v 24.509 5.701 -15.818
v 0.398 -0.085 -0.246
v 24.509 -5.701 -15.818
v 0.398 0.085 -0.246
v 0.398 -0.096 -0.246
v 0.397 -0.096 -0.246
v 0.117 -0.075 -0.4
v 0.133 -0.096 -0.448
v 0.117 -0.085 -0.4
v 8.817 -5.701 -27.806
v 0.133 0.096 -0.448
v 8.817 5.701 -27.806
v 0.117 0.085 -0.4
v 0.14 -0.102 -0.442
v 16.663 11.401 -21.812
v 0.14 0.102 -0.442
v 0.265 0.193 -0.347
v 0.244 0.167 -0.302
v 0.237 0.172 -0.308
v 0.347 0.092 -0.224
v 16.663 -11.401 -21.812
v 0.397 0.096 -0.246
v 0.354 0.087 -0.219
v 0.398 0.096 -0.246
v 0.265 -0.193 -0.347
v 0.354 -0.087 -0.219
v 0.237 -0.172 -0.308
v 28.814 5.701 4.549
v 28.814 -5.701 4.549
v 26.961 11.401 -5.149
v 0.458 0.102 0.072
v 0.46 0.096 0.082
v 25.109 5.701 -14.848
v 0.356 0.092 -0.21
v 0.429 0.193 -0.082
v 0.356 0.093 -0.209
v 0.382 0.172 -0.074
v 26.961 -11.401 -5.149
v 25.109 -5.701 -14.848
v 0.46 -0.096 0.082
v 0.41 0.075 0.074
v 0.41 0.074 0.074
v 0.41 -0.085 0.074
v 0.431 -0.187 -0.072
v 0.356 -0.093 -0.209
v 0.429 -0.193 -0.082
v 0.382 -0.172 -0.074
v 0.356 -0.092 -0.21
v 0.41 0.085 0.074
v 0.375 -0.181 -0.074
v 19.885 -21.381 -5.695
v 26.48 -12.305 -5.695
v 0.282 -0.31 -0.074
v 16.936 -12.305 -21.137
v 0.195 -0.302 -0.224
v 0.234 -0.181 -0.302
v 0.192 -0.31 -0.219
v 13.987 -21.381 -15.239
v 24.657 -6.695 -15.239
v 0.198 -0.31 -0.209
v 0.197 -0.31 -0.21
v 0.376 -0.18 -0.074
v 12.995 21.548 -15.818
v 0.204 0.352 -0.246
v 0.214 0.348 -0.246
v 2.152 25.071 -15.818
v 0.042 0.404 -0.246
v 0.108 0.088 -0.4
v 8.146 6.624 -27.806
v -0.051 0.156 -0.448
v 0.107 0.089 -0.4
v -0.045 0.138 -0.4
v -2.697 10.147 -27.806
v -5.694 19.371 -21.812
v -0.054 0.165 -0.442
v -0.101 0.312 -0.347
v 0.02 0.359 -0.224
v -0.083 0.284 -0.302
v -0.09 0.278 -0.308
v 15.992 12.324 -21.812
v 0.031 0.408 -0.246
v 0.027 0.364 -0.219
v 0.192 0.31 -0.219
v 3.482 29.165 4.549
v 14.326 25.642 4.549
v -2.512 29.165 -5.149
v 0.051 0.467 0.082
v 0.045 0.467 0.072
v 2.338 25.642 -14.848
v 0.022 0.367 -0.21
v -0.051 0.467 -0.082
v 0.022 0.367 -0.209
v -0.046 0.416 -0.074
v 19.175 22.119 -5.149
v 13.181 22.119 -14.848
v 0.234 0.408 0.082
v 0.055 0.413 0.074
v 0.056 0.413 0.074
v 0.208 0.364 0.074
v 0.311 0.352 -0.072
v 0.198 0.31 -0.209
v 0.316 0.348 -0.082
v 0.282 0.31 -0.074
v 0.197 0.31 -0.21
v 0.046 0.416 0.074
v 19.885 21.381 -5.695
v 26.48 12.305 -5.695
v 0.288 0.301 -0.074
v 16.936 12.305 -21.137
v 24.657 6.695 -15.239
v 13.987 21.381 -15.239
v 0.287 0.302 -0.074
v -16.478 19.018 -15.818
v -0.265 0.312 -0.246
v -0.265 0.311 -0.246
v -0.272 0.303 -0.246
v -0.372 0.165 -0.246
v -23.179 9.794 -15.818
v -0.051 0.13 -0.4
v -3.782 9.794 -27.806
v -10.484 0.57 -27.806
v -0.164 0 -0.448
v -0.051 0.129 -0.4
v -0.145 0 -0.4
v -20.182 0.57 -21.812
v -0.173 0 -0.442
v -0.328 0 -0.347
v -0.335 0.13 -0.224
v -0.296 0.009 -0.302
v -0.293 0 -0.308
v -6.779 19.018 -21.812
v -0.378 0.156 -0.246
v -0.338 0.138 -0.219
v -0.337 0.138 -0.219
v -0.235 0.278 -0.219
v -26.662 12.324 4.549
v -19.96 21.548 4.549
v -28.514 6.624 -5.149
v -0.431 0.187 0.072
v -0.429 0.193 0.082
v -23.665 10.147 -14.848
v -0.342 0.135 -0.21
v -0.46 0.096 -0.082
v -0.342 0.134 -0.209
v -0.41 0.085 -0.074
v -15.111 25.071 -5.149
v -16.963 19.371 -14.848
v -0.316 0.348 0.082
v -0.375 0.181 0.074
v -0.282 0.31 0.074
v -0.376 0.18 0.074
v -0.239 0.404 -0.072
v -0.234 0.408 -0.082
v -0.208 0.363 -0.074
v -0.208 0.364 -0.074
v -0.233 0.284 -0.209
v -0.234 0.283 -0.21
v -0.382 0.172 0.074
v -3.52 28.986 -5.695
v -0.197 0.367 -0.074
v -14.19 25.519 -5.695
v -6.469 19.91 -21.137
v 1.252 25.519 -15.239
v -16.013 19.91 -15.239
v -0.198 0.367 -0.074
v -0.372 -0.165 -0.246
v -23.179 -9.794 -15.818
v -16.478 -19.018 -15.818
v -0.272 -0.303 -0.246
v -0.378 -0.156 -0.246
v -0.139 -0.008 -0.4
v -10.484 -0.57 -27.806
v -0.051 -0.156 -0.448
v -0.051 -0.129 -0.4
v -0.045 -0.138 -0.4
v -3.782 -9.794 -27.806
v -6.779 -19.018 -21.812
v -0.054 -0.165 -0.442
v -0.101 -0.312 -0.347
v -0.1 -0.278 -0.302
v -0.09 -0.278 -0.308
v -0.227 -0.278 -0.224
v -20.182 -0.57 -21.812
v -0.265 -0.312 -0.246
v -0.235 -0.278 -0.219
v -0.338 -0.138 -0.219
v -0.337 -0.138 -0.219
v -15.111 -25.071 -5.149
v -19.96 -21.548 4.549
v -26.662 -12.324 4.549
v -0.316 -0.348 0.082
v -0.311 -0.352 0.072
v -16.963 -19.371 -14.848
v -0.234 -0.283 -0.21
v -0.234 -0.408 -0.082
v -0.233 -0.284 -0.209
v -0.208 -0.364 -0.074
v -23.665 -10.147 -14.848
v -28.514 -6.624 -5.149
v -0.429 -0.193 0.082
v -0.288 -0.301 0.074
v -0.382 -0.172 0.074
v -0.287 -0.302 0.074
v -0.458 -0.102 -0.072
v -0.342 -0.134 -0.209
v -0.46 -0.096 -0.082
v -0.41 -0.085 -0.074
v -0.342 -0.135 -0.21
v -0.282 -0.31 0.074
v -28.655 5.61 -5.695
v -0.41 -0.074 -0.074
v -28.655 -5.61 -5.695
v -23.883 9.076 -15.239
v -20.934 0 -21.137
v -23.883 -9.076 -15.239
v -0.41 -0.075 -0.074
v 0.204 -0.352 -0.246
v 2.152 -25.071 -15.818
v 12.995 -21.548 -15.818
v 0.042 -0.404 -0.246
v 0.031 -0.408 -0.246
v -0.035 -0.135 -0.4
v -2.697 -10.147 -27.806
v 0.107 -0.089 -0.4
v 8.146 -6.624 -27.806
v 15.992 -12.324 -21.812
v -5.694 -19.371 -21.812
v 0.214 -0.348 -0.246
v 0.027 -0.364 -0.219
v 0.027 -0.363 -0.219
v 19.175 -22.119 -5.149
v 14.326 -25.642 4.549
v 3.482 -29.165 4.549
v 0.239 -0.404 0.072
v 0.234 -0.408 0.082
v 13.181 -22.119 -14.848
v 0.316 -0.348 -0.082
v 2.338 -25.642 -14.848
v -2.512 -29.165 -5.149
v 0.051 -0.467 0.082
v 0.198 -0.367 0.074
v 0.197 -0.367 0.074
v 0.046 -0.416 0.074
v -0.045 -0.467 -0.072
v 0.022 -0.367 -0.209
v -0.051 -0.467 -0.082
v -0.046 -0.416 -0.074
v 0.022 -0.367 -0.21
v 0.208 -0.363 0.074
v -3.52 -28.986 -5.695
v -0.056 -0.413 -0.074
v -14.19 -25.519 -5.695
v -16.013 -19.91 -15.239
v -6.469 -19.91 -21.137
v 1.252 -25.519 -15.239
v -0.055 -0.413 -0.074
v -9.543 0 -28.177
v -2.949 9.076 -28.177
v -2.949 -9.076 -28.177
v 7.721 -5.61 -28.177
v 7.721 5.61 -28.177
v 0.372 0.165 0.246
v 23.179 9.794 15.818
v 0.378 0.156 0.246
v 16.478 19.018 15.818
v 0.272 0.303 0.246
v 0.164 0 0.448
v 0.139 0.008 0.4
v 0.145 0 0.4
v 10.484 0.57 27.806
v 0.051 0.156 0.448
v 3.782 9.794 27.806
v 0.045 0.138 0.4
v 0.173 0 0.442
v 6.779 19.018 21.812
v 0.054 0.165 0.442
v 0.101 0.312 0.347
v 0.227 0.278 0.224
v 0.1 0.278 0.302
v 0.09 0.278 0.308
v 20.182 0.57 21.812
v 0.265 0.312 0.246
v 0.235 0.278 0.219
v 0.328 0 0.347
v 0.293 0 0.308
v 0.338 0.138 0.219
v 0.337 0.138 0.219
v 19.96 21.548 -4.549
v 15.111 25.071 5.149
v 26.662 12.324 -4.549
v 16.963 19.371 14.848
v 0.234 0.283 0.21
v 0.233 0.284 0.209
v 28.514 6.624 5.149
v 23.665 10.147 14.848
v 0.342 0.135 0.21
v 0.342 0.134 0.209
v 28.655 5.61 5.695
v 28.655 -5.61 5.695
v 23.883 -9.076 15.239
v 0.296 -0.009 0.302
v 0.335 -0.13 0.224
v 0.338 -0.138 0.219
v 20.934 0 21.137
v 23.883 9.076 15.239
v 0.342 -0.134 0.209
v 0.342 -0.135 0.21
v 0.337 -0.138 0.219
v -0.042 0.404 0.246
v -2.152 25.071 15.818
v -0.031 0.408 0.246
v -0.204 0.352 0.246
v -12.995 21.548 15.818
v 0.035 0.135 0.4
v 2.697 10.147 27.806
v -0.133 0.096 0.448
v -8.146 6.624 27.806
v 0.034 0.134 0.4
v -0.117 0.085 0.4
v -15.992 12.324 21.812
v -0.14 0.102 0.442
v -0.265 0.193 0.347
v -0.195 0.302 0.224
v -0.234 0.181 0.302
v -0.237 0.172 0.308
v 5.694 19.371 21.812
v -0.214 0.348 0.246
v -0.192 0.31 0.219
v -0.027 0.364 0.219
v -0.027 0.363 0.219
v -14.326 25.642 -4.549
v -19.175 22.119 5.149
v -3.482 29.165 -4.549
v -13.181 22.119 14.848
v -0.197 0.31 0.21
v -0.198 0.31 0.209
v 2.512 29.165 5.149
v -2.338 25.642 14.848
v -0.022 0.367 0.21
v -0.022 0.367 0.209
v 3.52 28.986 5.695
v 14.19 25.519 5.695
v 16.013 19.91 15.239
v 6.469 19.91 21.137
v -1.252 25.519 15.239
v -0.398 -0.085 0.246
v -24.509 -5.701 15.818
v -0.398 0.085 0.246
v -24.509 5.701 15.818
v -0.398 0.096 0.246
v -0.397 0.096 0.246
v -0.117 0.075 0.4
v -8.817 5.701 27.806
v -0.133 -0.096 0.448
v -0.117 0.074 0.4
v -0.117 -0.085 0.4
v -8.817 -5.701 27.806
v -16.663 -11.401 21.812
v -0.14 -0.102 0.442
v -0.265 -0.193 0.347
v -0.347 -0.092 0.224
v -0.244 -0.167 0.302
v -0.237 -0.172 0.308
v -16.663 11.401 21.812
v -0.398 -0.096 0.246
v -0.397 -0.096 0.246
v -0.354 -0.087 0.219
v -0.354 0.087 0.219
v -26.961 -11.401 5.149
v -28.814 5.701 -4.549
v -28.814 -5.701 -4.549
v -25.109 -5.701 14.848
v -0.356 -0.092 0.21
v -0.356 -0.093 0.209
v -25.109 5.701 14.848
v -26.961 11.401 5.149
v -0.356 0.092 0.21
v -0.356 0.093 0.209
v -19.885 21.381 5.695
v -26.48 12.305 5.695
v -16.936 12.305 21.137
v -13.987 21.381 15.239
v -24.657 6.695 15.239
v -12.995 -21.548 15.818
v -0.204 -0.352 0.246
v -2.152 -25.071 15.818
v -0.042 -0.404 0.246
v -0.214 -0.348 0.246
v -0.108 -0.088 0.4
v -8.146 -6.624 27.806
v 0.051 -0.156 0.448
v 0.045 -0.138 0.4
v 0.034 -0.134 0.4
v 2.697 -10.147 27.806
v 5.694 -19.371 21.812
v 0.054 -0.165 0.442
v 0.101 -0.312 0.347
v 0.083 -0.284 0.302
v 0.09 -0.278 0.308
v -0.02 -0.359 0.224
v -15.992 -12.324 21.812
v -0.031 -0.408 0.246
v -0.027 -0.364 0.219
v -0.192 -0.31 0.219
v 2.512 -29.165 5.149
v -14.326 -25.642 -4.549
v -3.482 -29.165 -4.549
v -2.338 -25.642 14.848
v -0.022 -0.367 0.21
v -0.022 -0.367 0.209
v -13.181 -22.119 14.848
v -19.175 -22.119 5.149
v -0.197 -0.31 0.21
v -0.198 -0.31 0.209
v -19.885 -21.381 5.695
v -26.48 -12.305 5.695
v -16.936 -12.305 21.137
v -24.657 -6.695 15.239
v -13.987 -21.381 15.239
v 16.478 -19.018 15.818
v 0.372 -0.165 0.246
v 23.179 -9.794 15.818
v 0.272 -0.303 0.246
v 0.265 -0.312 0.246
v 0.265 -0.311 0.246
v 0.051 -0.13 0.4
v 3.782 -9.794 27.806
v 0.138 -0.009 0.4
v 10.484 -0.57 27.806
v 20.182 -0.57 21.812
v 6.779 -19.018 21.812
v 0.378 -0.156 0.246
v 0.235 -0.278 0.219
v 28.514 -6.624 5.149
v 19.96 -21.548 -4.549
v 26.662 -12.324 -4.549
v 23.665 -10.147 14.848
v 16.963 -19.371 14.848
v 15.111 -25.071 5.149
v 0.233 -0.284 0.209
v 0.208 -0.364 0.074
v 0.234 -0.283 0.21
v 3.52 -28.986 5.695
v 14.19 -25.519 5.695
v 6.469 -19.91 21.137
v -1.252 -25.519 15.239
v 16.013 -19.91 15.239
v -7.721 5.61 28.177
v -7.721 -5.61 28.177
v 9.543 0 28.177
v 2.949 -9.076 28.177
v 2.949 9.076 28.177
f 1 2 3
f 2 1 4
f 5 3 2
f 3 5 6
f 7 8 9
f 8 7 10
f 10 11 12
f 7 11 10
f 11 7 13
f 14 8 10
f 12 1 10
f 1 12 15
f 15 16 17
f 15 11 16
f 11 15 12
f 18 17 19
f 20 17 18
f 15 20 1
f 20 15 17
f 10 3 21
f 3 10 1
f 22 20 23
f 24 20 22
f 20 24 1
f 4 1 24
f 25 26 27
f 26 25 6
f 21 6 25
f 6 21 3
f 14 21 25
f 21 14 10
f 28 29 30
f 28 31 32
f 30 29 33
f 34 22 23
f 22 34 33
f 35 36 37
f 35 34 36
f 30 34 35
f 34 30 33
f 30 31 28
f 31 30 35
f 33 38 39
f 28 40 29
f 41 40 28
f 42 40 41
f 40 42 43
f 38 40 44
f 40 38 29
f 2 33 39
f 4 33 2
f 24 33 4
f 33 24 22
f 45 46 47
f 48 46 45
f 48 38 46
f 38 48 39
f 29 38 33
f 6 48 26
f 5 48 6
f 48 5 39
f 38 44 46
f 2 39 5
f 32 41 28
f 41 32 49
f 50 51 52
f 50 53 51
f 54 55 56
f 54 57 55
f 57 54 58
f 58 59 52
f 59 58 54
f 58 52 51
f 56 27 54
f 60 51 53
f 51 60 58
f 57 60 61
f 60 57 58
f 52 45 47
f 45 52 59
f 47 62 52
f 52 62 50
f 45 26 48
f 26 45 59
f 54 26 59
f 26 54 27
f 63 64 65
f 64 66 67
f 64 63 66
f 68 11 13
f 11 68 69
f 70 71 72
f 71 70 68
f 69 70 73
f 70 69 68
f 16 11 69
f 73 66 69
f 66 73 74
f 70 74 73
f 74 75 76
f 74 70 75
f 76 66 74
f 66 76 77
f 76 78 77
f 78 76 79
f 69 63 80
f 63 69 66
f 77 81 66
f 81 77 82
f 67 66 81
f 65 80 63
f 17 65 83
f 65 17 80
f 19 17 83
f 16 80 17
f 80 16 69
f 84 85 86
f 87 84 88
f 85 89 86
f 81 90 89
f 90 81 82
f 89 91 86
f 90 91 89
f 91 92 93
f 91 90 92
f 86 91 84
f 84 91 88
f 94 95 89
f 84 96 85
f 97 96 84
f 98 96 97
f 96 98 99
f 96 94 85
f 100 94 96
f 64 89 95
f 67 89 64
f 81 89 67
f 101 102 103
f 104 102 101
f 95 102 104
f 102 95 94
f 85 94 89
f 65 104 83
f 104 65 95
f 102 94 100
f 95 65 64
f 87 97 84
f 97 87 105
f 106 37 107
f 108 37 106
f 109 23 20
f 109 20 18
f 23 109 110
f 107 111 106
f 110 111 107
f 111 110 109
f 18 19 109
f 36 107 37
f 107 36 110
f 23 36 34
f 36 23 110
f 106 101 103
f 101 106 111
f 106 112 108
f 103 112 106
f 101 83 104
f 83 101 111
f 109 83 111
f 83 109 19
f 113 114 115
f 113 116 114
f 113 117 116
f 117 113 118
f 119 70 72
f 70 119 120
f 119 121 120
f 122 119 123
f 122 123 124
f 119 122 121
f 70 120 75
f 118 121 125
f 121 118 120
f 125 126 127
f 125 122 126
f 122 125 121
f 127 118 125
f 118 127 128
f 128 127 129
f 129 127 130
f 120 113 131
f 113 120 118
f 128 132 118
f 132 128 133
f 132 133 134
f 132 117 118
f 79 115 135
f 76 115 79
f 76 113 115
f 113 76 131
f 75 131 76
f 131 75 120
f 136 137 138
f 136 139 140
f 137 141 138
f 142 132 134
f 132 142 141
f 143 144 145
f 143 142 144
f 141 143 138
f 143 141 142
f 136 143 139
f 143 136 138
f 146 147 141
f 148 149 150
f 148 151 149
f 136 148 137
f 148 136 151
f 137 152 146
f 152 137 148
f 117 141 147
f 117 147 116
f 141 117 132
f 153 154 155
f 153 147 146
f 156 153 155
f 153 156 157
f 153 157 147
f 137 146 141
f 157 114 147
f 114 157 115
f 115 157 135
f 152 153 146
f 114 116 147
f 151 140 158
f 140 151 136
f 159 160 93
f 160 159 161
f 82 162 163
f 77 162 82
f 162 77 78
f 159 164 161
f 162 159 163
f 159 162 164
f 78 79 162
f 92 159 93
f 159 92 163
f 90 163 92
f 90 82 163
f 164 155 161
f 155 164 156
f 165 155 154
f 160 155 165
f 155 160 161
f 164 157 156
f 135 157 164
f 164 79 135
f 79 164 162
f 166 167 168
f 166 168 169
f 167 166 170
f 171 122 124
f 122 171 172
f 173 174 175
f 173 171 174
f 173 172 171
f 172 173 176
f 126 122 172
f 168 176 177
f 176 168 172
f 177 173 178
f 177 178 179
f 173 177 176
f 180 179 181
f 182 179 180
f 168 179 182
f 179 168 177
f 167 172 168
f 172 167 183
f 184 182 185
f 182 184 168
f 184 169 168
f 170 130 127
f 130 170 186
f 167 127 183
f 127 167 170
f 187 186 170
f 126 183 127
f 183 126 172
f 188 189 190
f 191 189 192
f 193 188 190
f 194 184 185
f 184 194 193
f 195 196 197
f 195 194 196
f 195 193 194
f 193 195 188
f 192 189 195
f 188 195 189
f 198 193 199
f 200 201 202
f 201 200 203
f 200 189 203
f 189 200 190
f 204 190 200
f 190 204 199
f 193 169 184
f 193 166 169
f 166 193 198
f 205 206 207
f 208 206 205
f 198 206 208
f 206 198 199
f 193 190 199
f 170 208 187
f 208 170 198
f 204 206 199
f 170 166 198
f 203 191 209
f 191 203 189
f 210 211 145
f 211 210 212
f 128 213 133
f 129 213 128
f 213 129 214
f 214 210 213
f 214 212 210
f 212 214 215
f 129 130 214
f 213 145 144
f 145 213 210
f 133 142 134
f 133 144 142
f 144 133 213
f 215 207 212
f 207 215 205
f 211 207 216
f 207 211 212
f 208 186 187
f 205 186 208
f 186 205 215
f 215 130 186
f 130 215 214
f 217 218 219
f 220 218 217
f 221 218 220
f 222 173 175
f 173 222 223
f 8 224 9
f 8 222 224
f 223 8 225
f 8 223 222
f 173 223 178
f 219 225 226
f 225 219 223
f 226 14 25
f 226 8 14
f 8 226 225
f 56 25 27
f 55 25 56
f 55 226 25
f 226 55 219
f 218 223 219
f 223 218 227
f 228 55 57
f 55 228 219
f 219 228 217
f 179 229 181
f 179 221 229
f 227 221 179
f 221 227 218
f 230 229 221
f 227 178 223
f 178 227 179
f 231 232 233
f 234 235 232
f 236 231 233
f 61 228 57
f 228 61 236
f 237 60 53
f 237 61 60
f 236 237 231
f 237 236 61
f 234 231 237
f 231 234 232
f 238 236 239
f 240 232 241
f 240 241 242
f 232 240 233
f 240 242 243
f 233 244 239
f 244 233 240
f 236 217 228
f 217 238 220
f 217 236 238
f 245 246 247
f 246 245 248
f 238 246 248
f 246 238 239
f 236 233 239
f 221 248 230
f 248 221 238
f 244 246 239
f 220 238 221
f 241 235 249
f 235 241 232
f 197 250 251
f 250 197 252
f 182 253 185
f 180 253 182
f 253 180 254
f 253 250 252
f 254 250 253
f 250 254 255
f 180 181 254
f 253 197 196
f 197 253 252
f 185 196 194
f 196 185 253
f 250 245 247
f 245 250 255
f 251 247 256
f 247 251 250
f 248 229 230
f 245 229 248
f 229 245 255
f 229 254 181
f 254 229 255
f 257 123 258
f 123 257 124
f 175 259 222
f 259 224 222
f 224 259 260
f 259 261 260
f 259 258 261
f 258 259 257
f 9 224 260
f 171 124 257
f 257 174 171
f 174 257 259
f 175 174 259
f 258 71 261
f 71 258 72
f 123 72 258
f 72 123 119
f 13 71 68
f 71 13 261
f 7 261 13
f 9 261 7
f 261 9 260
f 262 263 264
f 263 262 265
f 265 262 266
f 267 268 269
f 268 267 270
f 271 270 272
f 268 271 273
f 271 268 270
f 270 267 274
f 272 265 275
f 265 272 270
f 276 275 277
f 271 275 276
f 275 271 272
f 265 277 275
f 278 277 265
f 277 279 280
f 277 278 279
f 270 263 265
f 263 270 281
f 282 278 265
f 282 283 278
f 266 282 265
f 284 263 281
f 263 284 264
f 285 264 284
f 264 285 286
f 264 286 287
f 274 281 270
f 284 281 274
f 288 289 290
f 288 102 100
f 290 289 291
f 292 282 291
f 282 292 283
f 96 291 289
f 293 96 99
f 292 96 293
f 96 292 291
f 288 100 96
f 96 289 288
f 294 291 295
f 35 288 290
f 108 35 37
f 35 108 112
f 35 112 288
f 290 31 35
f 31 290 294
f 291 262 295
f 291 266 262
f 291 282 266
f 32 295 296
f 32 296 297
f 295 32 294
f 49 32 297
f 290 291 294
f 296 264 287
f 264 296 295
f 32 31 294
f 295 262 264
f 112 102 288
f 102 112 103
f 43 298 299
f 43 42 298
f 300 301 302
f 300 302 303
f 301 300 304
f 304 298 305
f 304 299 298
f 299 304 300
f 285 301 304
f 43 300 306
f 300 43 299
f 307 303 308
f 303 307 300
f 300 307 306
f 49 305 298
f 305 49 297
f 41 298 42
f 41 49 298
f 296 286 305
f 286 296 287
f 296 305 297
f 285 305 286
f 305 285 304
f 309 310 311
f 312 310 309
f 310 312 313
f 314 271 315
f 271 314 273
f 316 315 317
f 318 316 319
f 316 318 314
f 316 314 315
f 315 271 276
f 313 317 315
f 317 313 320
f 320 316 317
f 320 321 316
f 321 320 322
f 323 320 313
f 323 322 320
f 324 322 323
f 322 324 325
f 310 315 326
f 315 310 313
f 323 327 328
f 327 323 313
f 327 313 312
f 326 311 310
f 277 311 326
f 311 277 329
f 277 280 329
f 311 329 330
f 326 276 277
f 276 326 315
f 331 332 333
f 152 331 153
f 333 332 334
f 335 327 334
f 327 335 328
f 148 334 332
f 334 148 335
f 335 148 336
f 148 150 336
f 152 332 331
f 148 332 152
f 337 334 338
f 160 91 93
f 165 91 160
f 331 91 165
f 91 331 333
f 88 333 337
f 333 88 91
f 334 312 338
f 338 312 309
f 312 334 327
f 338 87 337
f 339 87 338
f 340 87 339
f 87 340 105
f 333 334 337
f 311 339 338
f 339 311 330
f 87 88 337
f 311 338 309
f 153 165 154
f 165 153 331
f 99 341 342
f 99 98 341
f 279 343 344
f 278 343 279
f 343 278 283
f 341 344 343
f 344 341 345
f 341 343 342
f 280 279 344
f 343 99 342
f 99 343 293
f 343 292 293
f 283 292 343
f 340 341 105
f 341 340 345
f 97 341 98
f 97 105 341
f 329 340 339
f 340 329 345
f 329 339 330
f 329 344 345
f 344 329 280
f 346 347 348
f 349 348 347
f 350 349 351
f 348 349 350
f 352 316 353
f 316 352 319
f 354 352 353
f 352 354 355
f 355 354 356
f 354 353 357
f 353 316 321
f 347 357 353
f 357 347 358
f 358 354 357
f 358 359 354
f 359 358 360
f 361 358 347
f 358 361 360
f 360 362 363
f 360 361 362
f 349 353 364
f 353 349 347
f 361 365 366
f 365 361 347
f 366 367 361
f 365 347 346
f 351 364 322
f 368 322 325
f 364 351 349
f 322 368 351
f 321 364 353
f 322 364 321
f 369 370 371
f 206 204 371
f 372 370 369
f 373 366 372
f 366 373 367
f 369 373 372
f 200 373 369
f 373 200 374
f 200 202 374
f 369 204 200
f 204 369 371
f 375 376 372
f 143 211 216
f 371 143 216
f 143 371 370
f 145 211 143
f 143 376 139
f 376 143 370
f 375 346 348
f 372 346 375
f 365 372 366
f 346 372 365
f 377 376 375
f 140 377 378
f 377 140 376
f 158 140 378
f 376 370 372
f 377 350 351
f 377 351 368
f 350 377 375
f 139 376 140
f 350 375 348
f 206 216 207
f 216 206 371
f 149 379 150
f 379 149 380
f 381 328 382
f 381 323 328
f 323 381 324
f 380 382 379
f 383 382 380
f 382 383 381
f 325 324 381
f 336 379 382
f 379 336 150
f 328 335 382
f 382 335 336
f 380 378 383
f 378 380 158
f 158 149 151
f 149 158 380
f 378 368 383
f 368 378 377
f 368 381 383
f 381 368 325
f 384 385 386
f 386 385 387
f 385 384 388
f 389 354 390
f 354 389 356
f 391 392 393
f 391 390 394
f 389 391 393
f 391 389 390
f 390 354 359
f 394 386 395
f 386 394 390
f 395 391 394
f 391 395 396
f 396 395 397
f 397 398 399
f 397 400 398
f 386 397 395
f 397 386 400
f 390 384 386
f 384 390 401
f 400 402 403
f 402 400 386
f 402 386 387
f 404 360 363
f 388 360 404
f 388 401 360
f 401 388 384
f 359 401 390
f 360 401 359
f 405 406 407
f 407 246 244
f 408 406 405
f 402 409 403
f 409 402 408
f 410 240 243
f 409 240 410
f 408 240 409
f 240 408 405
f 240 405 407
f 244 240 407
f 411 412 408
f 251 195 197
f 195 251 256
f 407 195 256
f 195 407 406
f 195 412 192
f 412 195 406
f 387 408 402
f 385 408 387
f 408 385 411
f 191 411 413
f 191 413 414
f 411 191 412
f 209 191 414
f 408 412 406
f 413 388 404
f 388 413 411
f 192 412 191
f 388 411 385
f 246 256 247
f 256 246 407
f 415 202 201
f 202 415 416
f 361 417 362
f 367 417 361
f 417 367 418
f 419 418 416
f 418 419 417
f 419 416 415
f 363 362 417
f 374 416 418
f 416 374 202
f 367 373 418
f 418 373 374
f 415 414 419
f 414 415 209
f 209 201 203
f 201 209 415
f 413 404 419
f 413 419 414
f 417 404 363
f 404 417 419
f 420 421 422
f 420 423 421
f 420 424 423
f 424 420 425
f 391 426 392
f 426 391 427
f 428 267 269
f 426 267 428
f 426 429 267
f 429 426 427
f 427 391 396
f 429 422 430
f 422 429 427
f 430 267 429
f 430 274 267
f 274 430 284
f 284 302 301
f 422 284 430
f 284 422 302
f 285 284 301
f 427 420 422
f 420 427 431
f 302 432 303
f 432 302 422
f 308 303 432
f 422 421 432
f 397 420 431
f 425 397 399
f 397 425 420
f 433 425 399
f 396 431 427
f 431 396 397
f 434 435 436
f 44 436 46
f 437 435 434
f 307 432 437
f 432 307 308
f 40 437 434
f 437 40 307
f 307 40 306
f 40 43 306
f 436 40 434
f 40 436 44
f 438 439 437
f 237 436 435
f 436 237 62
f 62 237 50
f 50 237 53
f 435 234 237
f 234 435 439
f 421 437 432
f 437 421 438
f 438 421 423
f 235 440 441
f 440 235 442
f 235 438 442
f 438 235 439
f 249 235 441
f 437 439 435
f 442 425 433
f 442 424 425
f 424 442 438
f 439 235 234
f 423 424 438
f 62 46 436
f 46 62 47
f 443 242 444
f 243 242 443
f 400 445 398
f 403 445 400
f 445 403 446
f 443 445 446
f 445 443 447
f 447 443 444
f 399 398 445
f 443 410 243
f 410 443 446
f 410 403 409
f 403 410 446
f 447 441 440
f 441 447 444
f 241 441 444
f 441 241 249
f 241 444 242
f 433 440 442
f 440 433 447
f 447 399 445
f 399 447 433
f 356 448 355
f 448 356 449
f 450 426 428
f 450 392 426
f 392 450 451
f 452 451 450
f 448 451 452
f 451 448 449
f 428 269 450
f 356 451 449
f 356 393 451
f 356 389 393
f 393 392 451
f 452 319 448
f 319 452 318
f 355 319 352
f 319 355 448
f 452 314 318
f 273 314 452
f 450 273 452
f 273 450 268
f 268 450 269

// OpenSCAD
module soccer_polyhedron(circumradius, spacing) {
    tau = 1.618034;
    a = -37.377368;
    scale_f = 0.201774;
    
    s = scale_f * spacing / 2;
    
    module pentagonal_pyramid() {
        pentagon_r = 1.701302;
        pentagon_h = 4.654877;

        color("black")
        translate([0, 0, -pentagon_h])
        linear_extrude(pentagon_h, scale = 0.001) 
        rotate(-36)
            circle(pentagon_r - s / cos(36) , $fn = 5);    
    }
    
    module hexagonal_pyramid() {
        hexagon_r = 2;
        hexagon_h = 4.534568;

        color("white")
        translate([0, 0, -hexagon_h])
        linear_extrude(hexagon_h, scale = 0.001) 
        rotate(-30)
            circle(hexagon_r - s / cos(30), $fn = 6);  
    }

    module one_component_around_pentagonal_pyramid() {
        mirror([1, 0, 0]) 
        rotate([0, -a, 60]) {
            pentagonal_pyramid();
            for(i = [0:1]) {
                rotate([0, a, 72 * i])
                    hexagonal_pyramid(); 
            }    
        }    
    }
    
    module half_soccer_polyhedron() {
        pentagonal_pyramid();
        for(i = [0:4]) {
            rotate([0, a, 72 * i])
                one_component_around_pentagonal_pyramid(); 
        }       
    }

    scale(scale_f * circumradius) {
        half_soccer_polyhedron();
        rotate(36)
        mirror([0, 0, 1])
            half_soccer_polyhedron();    
    }
}

soccer_polyhedron(30, 1);
%sphere(10, $fn = 48);
  
